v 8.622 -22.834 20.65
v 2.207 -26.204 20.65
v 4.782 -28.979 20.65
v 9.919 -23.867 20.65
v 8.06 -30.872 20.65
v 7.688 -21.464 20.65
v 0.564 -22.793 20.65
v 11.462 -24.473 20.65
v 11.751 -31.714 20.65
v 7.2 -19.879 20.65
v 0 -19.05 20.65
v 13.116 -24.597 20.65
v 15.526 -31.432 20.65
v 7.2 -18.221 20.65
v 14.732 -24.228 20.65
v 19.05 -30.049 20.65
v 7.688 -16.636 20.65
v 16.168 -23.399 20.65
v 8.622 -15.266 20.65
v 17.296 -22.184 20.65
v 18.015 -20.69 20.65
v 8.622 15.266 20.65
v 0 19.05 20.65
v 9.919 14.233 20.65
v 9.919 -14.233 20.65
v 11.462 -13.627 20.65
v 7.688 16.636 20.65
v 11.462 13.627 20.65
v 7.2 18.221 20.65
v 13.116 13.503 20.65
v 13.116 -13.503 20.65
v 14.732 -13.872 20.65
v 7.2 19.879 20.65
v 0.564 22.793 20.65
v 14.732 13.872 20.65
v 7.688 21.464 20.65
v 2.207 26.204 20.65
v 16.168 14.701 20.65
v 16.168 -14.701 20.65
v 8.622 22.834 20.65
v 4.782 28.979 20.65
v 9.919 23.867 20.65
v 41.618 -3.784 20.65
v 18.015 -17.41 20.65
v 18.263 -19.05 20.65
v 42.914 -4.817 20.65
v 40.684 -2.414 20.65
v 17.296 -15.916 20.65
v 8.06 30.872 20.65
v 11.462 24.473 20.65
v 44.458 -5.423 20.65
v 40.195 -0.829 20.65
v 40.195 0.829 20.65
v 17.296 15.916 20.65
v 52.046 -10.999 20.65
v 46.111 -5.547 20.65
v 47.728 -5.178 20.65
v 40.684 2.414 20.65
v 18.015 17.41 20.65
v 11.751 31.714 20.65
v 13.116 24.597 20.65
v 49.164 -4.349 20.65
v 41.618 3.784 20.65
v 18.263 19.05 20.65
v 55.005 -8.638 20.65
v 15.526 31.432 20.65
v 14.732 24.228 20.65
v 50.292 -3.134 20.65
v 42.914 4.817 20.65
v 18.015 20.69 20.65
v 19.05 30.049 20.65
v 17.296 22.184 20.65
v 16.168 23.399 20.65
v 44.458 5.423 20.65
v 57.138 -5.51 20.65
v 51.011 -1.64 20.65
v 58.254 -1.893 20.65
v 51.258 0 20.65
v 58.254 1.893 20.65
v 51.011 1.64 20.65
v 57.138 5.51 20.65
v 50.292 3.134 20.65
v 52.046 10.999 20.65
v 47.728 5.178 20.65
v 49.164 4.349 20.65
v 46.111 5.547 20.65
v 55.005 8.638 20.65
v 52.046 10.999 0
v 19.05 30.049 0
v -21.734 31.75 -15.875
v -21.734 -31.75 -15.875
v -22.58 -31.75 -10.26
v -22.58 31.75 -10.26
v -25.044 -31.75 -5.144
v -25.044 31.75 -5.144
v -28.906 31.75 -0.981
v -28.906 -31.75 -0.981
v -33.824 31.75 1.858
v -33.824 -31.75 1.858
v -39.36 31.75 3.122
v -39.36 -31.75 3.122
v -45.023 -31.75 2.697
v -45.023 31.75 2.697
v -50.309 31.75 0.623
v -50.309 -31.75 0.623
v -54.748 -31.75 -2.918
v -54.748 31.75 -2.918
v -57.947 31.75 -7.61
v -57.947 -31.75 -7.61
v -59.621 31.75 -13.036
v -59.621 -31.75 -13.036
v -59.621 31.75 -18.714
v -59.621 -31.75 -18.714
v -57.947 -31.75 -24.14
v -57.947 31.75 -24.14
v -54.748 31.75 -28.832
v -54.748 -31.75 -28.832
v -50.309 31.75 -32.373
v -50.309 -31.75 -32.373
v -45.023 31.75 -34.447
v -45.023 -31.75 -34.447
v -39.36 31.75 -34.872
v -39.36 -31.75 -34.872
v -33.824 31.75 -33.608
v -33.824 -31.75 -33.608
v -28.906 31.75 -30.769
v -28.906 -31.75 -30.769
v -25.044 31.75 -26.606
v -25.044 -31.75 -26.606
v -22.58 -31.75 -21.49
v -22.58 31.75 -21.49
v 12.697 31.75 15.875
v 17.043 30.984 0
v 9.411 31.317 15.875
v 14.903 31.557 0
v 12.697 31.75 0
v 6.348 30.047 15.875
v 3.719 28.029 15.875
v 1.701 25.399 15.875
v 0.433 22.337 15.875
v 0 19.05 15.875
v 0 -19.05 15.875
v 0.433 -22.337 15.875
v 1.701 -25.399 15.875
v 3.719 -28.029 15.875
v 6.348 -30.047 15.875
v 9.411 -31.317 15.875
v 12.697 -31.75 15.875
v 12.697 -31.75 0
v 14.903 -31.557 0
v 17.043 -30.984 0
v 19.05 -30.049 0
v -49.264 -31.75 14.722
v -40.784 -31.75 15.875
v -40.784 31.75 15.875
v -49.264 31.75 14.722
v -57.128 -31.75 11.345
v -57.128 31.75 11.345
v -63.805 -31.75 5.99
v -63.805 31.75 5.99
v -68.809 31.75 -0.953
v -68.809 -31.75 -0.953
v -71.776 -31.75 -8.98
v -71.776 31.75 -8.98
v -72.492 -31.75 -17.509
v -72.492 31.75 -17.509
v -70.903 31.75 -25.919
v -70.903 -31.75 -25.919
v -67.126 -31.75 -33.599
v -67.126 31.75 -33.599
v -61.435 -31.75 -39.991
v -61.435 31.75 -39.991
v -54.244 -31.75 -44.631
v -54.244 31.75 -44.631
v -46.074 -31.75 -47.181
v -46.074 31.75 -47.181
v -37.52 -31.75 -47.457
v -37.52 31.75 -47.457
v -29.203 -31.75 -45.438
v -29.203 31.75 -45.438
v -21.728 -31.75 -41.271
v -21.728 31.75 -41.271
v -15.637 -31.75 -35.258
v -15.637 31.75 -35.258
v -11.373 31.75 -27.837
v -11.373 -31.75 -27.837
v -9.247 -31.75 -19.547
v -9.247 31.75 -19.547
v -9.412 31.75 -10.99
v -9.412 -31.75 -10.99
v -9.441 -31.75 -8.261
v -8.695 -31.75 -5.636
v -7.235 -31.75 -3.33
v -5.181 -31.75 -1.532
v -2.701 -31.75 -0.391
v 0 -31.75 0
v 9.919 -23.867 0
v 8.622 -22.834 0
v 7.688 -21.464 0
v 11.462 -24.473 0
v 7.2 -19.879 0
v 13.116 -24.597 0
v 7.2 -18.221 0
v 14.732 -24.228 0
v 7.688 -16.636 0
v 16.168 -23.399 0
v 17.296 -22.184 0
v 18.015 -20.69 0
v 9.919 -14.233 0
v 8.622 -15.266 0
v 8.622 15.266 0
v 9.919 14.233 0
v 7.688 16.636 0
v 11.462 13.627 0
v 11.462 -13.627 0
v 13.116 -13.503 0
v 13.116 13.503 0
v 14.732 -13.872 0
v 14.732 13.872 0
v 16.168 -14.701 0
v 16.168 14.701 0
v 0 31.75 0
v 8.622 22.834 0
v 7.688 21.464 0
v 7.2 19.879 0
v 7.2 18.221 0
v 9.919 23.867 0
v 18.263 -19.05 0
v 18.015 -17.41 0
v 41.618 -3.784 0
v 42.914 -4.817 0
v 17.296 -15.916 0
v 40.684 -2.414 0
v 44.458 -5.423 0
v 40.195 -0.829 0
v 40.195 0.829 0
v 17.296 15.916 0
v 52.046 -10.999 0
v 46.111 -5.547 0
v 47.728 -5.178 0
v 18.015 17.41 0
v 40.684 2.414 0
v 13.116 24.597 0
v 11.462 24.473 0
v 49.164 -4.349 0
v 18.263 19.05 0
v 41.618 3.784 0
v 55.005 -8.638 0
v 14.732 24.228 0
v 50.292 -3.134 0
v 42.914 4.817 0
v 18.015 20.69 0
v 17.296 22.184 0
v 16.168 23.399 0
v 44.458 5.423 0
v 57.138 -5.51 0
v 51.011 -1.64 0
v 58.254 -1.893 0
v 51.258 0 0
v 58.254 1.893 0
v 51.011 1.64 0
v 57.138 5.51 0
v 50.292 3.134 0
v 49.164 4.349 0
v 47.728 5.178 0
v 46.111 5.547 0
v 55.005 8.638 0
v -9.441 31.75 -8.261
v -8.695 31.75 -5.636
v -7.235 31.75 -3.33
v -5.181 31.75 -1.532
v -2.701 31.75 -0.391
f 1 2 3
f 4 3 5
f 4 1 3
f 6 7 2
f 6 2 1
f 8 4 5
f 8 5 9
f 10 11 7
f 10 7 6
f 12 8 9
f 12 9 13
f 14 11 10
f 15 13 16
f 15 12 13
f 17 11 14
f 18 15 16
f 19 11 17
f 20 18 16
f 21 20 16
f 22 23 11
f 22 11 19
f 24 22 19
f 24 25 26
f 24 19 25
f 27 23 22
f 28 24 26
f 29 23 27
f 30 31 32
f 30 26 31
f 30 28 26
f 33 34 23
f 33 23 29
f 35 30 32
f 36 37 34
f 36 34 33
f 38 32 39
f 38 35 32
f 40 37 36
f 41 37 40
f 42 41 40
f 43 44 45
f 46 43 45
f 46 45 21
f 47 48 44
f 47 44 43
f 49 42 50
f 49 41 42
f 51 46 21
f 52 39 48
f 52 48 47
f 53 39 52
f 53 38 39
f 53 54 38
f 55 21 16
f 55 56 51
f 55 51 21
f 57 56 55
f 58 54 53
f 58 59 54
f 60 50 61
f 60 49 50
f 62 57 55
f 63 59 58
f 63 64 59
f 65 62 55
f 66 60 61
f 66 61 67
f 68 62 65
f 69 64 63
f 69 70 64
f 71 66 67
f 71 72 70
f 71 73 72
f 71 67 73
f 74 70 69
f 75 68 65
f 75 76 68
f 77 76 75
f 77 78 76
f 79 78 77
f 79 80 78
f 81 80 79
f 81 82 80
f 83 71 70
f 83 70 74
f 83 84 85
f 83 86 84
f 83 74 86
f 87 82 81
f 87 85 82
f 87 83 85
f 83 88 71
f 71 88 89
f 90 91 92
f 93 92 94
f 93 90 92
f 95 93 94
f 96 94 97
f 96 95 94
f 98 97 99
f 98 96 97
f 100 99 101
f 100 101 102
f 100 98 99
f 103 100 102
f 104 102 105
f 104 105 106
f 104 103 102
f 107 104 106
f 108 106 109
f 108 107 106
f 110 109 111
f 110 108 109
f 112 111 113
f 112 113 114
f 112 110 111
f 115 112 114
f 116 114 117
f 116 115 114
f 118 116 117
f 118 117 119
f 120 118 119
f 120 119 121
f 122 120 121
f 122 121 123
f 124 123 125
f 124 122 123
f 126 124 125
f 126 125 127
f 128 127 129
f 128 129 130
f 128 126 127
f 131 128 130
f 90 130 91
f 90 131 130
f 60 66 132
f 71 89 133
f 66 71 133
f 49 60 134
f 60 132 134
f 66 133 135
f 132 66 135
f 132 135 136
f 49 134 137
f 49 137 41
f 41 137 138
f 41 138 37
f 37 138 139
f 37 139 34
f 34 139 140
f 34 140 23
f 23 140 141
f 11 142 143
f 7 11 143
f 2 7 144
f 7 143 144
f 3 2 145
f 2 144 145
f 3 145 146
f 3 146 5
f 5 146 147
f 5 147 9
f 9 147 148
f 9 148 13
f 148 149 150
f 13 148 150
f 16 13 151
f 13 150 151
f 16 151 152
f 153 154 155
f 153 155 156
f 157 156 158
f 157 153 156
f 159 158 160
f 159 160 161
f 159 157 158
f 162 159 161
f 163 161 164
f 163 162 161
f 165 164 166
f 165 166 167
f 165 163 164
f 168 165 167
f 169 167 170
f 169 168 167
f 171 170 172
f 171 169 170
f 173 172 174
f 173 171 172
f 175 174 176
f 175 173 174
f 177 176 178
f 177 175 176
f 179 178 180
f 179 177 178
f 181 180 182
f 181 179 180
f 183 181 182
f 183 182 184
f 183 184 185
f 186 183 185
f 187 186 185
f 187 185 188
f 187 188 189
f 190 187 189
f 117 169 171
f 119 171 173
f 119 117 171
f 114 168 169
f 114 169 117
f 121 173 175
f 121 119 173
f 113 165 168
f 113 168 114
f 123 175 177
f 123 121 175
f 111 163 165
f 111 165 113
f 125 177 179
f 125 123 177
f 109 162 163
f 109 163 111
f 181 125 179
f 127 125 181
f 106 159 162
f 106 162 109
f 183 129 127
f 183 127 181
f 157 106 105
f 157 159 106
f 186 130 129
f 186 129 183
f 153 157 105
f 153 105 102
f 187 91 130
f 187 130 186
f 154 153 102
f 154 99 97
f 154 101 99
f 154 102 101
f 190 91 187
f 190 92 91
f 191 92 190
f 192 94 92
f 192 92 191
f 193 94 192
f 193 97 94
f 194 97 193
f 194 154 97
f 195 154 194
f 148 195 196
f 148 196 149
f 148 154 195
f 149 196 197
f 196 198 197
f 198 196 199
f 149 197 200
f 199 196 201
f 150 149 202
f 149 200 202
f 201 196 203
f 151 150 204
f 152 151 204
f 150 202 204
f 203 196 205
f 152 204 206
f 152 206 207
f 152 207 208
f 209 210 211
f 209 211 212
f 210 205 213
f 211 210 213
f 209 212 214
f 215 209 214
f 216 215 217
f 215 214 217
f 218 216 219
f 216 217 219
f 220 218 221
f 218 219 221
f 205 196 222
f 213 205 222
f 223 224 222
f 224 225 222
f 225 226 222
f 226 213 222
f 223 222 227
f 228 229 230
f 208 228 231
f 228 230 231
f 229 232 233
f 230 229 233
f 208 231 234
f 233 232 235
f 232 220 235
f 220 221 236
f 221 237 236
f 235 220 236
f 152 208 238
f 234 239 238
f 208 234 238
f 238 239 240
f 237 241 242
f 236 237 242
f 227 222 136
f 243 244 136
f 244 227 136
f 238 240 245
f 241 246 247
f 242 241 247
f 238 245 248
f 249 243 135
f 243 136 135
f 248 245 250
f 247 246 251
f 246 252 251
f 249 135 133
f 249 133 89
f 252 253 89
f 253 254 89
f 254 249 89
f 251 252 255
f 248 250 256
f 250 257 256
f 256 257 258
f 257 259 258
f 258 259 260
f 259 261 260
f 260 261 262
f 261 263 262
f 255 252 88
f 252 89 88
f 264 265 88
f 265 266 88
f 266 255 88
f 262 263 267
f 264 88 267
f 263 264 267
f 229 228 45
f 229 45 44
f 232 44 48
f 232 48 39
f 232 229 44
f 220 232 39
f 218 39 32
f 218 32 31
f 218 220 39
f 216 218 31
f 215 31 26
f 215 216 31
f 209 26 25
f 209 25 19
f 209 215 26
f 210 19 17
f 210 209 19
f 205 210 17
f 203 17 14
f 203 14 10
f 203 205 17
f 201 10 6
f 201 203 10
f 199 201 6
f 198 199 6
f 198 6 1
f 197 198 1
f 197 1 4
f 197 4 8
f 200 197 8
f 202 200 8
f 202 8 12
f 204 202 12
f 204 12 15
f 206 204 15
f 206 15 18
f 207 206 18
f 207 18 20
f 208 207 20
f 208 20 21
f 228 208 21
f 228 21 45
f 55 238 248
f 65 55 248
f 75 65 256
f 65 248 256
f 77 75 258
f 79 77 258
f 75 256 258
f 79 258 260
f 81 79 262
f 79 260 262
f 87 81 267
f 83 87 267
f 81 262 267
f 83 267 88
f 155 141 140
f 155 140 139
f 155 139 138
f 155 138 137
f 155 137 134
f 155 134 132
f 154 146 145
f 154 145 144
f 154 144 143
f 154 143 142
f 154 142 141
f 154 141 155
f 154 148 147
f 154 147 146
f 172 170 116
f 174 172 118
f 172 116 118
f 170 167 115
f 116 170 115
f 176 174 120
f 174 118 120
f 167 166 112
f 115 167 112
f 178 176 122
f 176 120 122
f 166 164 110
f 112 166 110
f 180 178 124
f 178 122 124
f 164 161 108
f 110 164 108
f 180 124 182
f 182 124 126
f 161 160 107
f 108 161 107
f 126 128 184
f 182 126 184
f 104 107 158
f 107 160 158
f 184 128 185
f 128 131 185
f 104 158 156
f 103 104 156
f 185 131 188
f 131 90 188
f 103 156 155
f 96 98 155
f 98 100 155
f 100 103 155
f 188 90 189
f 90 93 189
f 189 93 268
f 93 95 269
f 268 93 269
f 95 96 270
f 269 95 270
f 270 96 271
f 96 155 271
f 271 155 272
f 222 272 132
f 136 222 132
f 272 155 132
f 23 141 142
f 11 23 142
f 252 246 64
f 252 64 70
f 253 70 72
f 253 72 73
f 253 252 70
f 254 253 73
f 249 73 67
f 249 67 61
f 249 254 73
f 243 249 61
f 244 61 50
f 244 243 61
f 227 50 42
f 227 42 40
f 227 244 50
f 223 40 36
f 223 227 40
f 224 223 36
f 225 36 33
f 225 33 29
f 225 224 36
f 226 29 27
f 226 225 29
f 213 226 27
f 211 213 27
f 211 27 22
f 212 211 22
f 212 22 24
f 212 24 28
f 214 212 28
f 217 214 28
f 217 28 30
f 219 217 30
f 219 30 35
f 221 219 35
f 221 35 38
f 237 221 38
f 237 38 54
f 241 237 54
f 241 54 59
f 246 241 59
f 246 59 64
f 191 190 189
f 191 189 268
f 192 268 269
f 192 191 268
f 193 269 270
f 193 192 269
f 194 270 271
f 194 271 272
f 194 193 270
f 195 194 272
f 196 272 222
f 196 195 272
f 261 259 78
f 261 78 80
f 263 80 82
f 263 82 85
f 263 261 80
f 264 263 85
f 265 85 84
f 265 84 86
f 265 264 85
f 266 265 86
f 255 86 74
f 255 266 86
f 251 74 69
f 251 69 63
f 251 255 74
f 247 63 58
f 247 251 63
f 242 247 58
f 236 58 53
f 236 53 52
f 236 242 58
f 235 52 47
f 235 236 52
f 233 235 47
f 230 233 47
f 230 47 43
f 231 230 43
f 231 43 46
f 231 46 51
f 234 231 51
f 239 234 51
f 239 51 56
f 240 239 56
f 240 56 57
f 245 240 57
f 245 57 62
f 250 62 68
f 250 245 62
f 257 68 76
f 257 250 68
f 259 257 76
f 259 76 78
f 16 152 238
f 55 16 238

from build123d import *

# Parameters (mm, degrees)
F0_R     = 5.5626
F1_DEPTH = 20.6502
F2_R     = 19.05
F3_DEPTH = 31.75
F5_DEPTH = 68.2762


with BuildPart() as f1:
    # F0 (on Top) → F1 (new body)
    with BuildSketch(Plane.XY):
        with BuildLine():
            ThreePointArc((19.05, 30.048523), (6.35, 30.048523), (0, 19.05))
            Line((0, 19.05), (0, -19.05))
            ThreePointArc((0, -19.05), (6.35, -30.048523), (19.05, -30.048523))
            Line((19.05, -30.048523), (52.045568, -10.998523))
            ThreePointArc((52.045568, -10.998523), (58.395568, 0), (52.045568, 10.998523))
            Line((52.045568, 10.998523), (19.05, 30.048523))
        make_face()
        with Locations((12.7, -19.05)):
            Circle(F0_R, mode=Mode.SUBTRACT)
        with Locations((12.7, 19.05)):
            Circle(F0_R, mode=Mode.SUBTRACT)
        with Locations((45.695568, 0)):
            Circle(F0_R, mode=Mode.SUBTRACT)
    extrude(amount=F1_DEPTH)

    # F2 (on Front) → F3 (join, symmetric)
    with BuildSketch(Plane.XZ):
        with BuildLine():
            Line((12.7, 15.875), (-40.783613, 15.875))
            ThreePointArc((-40.783613, 15.875), (-61.435199, -39.990856), (-9.411603, -10.990385))
            ThreePointArc((-9.411603, -10.990385), (-7.234757, -3.329524), (0, 0))
            Line((0, 0), (12.7, 0))
            Line((12.7, 0), (12.7, 15.875))
        make_face()
        with Locations((-40.783613, -15.875)):
            Circle(F2_R, mode=Mode.SUBTRACT)
    extrude(amount=F3_DEPTH, both=True)

    # F4 (on face) → F5 (cut, through all)
    with BuildSketch(Plane.XY.offset(20.6502)):
        with BuildLine():
            Line((12.7, 13.4874), (12.7, 24.6126))
            ThreePointArc((12.7, 24.6126), (7.1374, 19.05), (12.7, 13.4874))
        make_face()
        with BuildLine():
            ThreePointArc((12.7, -13.4874), (7.1374, -19.05), (12.7, -24.6126))
            Line((12.7, -24.6126), (12.7, -13.4874))
        make_face()
    extrude(amount=-F5_DEPTH, mode=Mode.SUBTRACT)


solid = f1.part
